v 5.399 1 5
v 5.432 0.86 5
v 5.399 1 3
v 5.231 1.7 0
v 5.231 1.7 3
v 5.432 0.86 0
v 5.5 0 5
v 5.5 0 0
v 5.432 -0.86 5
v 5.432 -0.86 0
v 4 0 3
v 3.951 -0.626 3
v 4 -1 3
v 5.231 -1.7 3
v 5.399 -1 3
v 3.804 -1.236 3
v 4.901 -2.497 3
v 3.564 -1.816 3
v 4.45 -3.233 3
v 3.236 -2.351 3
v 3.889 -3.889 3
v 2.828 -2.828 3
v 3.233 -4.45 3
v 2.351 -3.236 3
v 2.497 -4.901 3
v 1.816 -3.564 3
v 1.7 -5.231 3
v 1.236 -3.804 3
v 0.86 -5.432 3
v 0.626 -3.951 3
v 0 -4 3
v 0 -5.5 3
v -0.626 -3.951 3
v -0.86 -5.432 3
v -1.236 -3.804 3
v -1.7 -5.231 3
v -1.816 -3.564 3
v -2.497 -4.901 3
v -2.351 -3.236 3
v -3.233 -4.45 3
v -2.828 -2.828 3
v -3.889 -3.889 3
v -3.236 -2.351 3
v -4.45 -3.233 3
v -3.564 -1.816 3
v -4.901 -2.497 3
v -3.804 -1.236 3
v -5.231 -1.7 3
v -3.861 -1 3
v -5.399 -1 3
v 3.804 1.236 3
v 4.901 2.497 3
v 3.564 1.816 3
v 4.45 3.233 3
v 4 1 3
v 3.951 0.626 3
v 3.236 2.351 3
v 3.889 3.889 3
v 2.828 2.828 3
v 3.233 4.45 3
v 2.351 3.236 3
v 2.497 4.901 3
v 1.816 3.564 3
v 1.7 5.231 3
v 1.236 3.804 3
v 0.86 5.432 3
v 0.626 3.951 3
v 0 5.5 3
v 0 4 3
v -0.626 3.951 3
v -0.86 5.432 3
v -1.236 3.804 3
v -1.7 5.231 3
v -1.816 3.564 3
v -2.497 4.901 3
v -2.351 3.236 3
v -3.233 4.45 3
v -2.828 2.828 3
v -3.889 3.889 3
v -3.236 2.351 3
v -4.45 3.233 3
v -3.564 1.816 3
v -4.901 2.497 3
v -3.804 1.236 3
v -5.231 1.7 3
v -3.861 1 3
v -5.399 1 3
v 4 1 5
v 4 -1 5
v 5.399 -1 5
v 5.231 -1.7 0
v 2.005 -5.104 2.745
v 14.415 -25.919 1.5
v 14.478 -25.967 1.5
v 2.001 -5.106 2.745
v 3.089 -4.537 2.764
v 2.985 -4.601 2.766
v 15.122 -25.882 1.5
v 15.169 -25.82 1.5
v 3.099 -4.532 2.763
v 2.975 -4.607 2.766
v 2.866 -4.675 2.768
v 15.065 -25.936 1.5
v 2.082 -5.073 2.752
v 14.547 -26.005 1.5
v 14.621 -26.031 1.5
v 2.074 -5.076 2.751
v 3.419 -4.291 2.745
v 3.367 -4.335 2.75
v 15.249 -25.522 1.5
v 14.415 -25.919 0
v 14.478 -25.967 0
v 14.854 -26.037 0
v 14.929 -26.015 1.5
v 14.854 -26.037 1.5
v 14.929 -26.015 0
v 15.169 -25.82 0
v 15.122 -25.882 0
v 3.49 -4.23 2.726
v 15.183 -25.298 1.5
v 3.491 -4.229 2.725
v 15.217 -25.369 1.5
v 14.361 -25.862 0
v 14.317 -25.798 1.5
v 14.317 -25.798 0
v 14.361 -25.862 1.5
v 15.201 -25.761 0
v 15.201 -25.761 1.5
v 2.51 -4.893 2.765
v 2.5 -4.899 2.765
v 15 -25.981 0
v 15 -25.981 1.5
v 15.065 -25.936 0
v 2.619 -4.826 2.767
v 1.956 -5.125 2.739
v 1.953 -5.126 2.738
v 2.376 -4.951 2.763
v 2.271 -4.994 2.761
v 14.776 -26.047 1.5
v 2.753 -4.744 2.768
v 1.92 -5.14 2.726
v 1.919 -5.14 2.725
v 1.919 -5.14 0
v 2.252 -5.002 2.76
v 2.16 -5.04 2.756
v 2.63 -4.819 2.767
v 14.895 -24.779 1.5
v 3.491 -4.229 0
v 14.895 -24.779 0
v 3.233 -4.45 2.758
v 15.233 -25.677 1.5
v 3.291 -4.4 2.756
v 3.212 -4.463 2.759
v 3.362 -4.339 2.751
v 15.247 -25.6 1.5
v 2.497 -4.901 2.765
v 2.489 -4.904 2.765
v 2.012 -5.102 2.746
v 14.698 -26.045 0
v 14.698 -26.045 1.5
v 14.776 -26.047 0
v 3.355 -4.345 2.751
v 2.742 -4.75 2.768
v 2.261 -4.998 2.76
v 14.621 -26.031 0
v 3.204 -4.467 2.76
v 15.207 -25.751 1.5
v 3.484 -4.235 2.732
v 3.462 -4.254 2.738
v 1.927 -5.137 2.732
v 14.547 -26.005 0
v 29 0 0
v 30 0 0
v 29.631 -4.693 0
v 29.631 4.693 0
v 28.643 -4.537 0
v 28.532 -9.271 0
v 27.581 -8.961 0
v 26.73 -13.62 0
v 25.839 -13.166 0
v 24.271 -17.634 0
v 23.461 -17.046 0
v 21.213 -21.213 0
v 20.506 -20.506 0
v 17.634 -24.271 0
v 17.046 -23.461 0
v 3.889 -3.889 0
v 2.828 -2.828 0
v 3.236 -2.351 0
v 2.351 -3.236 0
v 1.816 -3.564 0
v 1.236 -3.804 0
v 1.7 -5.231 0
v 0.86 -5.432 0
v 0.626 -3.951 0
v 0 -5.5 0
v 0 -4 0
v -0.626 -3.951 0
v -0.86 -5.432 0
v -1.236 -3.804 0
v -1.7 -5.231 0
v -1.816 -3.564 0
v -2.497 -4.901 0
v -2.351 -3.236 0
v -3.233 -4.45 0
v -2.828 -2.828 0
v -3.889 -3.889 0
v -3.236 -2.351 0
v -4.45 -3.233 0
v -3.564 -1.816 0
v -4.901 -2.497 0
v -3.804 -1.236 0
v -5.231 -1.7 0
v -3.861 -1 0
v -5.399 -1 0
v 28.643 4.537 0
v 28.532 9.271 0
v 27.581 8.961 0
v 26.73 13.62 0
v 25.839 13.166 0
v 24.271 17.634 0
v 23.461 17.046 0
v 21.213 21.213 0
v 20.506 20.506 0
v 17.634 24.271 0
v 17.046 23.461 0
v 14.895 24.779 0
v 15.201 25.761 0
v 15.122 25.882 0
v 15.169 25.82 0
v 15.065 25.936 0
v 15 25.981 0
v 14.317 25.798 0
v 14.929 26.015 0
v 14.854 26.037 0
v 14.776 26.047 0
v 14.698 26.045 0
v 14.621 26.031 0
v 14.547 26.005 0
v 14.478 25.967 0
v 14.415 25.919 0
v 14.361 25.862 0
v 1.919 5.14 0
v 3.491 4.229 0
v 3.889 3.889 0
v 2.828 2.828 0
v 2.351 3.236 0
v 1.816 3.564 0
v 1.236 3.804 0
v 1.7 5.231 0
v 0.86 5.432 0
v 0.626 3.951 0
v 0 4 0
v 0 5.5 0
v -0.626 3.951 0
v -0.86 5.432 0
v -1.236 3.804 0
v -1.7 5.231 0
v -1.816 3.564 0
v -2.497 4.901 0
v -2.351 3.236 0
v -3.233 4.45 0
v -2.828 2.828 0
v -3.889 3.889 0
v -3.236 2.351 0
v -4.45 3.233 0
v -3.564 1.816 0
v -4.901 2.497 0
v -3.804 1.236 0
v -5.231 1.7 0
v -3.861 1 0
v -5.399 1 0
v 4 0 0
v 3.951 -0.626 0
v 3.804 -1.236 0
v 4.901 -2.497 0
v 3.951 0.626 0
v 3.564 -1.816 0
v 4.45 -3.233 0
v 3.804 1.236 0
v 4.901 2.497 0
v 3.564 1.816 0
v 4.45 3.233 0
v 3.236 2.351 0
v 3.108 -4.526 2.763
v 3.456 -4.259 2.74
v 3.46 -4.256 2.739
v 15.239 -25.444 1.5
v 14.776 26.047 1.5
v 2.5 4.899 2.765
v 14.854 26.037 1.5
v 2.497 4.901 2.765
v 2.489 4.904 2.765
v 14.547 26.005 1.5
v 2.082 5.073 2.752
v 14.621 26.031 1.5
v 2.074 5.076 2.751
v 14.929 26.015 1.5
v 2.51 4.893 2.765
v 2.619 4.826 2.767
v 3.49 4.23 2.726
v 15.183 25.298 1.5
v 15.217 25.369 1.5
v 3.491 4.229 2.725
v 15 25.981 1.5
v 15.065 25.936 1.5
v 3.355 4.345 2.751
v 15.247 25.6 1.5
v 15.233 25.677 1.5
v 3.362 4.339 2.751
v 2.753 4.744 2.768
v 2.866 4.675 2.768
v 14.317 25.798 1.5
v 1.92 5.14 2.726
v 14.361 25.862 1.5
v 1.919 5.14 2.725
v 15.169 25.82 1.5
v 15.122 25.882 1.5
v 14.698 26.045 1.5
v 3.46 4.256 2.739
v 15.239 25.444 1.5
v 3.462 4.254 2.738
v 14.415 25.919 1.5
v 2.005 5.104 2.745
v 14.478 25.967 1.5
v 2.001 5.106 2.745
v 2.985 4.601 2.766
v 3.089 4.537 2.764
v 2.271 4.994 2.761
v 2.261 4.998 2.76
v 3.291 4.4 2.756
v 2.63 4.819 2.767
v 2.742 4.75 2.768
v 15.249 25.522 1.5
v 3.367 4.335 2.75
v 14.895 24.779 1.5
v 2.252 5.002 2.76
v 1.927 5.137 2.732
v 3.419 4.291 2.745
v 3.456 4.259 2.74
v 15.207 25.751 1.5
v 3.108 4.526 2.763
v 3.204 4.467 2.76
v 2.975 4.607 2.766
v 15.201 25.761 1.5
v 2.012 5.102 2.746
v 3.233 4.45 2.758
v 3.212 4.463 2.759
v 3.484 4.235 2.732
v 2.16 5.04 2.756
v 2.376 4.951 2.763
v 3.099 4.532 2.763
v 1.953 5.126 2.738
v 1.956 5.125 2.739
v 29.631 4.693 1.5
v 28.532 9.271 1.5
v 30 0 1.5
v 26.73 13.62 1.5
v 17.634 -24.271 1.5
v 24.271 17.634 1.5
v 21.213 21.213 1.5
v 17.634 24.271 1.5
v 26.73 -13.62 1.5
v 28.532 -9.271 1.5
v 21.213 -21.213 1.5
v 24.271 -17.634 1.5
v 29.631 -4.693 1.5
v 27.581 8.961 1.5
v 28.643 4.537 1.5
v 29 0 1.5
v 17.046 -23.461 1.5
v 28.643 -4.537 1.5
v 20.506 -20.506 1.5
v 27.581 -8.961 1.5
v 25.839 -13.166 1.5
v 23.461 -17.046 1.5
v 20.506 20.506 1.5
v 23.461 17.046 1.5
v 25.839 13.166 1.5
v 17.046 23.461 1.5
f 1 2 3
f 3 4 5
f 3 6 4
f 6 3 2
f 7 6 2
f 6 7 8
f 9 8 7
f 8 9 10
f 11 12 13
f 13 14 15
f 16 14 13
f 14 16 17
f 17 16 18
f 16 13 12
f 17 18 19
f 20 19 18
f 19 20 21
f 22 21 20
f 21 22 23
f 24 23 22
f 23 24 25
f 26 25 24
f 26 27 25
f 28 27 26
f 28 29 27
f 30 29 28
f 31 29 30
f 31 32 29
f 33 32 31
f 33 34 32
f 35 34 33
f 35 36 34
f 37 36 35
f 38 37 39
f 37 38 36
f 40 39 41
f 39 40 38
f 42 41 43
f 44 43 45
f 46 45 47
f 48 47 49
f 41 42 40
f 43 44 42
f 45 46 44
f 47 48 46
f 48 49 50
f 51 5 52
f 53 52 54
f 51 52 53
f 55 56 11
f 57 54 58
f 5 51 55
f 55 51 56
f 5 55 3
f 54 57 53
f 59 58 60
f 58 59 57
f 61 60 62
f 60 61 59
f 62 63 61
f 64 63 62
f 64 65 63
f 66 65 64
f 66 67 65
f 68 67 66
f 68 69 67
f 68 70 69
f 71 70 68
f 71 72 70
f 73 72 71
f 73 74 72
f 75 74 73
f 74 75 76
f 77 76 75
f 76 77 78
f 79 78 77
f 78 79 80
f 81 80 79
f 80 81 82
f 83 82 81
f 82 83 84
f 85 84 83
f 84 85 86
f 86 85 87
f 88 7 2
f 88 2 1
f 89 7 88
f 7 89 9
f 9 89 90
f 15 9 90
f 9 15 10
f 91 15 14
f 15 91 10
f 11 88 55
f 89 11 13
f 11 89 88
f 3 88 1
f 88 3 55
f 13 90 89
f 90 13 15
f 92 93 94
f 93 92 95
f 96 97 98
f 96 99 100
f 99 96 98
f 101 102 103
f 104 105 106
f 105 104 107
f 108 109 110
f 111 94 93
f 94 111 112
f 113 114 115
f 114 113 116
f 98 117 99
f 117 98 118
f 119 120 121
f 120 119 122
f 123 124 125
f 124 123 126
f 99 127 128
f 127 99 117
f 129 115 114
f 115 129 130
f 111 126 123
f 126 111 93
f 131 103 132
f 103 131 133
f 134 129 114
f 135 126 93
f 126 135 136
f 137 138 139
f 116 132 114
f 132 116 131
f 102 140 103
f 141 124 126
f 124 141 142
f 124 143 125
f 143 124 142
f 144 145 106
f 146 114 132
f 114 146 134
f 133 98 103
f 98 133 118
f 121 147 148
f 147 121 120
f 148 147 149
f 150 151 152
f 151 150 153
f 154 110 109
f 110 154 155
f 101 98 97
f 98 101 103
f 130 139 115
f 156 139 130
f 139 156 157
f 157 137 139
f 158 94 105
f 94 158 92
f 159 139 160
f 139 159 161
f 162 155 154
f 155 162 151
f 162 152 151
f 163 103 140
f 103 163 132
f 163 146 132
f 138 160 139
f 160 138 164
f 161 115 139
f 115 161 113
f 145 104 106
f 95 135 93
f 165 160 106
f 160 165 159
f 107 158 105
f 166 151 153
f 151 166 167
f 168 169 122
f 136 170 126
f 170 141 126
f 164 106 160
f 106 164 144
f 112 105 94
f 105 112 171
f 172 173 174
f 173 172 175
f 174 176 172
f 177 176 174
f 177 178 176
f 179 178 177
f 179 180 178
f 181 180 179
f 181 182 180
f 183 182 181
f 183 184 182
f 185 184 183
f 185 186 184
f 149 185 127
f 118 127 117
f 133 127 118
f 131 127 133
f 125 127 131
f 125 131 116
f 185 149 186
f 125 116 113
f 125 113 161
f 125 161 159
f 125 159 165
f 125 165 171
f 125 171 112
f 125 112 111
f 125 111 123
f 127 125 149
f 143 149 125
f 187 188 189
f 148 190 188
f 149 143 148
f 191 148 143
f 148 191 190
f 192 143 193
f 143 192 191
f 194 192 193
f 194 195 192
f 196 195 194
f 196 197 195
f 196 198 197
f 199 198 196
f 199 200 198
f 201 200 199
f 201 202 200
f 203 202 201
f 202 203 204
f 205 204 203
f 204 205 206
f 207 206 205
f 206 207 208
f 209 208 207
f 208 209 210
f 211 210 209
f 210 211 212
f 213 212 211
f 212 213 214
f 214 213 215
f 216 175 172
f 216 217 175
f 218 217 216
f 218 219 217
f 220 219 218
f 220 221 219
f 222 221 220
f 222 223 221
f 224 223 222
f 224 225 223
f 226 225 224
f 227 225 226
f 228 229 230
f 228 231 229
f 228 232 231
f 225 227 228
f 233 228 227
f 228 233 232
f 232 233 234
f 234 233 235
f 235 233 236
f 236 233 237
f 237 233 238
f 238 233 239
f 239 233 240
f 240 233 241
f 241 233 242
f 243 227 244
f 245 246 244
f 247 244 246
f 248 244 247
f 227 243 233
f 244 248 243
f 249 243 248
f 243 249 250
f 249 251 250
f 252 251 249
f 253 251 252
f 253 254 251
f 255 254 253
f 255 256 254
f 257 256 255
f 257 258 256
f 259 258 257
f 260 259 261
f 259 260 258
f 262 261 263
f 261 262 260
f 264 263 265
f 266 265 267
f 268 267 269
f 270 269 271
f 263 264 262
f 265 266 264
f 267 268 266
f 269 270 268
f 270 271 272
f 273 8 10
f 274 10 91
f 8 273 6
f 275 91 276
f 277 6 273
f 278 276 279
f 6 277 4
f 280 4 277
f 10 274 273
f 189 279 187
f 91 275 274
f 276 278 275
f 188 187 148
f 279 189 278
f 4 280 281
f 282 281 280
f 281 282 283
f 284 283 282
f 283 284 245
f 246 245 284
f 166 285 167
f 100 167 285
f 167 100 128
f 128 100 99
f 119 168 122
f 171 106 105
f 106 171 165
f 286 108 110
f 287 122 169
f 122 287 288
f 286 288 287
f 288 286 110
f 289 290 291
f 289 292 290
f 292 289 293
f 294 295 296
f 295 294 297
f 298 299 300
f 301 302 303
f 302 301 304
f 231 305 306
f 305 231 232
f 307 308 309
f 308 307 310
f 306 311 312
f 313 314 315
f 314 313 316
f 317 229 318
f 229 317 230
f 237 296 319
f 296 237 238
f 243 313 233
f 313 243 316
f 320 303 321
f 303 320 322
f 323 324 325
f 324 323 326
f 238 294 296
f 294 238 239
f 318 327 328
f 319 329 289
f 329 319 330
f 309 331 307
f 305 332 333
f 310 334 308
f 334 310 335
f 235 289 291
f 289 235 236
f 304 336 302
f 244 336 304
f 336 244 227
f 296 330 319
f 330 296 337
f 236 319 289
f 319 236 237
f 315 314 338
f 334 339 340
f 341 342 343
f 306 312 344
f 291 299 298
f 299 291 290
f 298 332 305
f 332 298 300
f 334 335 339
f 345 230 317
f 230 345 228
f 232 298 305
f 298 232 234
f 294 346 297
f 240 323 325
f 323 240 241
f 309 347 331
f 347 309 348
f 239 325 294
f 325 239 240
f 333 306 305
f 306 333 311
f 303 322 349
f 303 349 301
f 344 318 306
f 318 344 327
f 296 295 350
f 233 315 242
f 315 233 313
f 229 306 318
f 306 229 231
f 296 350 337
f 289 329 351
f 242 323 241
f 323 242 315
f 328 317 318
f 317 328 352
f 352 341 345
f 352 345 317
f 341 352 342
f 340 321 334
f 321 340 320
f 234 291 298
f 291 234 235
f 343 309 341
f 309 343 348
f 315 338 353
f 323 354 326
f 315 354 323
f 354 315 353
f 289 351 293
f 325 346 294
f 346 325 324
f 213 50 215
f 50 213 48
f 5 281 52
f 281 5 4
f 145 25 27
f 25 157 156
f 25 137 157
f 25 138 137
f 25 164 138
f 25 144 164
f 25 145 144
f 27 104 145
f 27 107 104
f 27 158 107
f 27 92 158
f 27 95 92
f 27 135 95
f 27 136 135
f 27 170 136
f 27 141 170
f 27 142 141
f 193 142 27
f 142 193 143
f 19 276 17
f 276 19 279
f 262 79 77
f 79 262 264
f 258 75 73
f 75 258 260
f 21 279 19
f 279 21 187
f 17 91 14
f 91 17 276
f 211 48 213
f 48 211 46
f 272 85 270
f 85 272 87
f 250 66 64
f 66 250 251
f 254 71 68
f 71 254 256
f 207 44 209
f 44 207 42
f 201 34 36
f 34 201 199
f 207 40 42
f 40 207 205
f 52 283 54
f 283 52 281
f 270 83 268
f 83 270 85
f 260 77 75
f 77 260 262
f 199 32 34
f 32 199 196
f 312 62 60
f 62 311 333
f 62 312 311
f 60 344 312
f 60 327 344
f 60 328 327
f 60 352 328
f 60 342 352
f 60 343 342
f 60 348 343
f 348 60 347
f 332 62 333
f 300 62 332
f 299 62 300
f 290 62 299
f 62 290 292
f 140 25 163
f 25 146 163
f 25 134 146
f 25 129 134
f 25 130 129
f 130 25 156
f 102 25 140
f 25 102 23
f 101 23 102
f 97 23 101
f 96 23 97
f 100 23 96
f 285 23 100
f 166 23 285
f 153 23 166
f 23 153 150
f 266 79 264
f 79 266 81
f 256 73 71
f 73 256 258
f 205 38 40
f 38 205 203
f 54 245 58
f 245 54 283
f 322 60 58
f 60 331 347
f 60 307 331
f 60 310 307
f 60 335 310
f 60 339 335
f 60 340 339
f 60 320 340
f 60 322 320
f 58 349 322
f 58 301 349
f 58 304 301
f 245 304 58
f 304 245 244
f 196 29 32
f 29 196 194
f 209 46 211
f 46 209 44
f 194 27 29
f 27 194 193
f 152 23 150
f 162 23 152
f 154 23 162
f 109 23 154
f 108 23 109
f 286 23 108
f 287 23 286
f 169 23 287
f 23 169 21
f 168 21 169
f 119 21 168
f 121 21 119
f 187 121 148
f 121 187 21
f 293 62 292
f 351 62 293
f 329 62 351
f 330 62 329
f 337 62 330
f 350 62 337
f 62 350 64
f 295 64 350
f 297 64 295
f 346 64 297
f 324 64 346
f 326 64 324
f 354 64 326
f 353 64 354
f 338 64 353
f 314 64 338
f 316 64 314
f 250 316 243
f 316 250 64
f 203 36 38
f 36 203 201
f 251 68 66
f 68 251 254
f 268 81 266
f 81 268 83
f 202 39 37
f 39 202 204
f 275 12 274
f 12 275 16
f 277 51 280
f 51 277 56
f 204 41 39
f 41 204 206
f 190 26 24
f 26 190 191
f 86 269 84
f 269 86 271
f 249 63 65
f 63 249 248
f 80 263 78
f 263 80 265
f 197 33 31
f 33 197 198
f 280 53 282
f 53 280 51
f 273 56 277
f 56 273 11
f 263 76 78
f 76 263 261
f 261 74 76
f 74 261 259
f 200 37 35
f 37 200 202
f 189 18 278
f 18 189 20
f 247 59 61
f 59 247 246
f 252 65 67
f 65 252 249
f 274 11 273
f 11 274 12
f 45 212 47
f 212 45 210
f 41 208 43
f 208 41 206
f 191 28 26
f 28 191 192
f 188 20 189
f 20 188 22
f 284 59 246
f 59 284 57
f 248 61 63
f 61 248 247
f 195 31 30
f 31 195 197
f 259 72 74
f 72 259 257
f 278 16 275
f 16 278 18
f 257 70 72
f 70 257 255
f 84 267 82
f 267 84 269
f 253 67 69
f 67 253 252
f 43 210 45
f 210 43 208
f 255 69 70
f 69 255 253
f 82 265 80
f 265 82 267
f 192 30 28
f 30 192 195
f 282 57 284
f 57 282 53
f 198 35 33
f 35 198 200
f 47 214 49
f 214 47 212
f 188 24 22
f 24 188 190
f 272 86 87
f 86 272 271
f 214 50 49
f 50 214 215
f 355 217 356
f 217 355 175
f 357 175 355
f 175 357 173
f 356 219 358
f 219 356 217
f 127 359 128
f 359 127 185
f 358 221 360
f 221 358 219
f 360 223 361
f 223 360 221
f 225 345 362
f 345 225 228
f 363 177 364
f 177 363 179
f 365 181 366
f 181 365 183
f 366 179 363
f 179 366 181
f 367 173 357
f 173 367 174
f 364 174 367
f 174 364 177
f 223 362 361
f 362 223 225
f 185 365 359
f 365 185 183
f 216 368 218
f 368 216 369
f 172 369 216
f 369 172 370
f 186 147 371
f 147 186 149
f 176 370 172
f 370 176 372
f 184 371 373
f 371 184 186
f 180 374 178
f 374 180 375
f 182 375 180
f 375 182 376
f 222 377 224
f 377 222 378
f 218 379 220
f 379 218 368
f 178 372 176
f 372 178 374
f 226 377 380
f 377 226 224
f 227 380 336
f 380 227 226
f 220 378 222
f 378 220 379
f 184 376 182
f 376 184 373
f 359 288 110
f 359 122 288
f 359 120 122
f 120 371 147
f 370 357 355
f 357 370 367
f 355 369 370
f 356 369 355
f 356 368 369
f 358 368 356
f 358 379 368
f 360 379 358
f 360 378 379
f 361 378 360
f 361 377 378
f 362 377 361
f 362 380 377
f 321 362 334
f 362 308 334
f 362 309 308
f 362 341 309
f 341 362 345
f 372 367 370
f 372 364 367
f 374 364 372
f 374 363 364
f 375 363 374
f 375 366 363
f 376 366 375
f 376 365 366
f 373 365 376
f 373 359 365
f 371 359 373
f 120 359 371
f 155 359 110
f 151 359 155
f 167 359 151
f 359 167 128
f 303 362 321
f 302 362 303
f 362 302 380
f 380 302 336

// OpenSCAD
// motor clip internal diameter
motor_d = 8; 
// motor clip height
motor_h = 3;    
// motor clip thickness
motor_t = 1.5; 
// motor clip pin height
pin_h = 2;      
// motor clip pin width
pin_w = 2;      
// motor clip pin z rotation angle
pin_r = 0;      
// motor clip cut width
cut_w = 2;      
// guard height
guard_h = 1.5;  
// guard width
guard_w = 1;    
// arm length from motor center
arm_l = 30;     
// arm base height
arm_base_h = 3; 
// arm base width
arm_base_w = 2; 
// angle between the two arms
arm_a = 120; // [0:180]   

module prop_guard() {
    $fn=40;

    difference() {
        union() {
            arm(-arm_a/2);
            arm(arm_a/2);
            cylinder(r=motor_d/2+motor_t,h=motor_h);
            rotate([0,0,0])translate([0,0,motor_h]) motor_pin();
        }
        cylinder(r=motor_d/2,h=motor_h);
        translate([-motor_d/2-motor_t,-cut_w/2,0]) cube([motor_t*2,cut_w,motor_h]);
    }

    intersection() {
        difference() {
            cylinder(r=arm_l,h=2);
            cylinder(r=arm_l-guard_w,h=guard_h);
        }
        hull() {
            rotate([0,0,-arm_a/2]) cube([arm_l*2,0.1,guard_h]);
            cube([arm_l*2,0.1,guard_h]);
            rotate([0,0,arm_a/2]) cube([arm_l*2,0.1,guard_h]);
        }
    }
}

module arm(angle) {
    rotate([0,0,angle])hull() {
        cylinder(r=arm_base_w/2,h=arm_base_h);
        translate([arm_l-guard_w/2,0,0])cylinder(r=guard_w/2,h=guard_h);
    }
}

module motor_pin() {
    intersection() {
        cylinder(r=motor_d/2+motor_t,h=pin_h);
        translate([motor_d/2,-pin_w/2,0])cube([motor_t,pin_w,pin_h]);
    }
}

prop_guard();
